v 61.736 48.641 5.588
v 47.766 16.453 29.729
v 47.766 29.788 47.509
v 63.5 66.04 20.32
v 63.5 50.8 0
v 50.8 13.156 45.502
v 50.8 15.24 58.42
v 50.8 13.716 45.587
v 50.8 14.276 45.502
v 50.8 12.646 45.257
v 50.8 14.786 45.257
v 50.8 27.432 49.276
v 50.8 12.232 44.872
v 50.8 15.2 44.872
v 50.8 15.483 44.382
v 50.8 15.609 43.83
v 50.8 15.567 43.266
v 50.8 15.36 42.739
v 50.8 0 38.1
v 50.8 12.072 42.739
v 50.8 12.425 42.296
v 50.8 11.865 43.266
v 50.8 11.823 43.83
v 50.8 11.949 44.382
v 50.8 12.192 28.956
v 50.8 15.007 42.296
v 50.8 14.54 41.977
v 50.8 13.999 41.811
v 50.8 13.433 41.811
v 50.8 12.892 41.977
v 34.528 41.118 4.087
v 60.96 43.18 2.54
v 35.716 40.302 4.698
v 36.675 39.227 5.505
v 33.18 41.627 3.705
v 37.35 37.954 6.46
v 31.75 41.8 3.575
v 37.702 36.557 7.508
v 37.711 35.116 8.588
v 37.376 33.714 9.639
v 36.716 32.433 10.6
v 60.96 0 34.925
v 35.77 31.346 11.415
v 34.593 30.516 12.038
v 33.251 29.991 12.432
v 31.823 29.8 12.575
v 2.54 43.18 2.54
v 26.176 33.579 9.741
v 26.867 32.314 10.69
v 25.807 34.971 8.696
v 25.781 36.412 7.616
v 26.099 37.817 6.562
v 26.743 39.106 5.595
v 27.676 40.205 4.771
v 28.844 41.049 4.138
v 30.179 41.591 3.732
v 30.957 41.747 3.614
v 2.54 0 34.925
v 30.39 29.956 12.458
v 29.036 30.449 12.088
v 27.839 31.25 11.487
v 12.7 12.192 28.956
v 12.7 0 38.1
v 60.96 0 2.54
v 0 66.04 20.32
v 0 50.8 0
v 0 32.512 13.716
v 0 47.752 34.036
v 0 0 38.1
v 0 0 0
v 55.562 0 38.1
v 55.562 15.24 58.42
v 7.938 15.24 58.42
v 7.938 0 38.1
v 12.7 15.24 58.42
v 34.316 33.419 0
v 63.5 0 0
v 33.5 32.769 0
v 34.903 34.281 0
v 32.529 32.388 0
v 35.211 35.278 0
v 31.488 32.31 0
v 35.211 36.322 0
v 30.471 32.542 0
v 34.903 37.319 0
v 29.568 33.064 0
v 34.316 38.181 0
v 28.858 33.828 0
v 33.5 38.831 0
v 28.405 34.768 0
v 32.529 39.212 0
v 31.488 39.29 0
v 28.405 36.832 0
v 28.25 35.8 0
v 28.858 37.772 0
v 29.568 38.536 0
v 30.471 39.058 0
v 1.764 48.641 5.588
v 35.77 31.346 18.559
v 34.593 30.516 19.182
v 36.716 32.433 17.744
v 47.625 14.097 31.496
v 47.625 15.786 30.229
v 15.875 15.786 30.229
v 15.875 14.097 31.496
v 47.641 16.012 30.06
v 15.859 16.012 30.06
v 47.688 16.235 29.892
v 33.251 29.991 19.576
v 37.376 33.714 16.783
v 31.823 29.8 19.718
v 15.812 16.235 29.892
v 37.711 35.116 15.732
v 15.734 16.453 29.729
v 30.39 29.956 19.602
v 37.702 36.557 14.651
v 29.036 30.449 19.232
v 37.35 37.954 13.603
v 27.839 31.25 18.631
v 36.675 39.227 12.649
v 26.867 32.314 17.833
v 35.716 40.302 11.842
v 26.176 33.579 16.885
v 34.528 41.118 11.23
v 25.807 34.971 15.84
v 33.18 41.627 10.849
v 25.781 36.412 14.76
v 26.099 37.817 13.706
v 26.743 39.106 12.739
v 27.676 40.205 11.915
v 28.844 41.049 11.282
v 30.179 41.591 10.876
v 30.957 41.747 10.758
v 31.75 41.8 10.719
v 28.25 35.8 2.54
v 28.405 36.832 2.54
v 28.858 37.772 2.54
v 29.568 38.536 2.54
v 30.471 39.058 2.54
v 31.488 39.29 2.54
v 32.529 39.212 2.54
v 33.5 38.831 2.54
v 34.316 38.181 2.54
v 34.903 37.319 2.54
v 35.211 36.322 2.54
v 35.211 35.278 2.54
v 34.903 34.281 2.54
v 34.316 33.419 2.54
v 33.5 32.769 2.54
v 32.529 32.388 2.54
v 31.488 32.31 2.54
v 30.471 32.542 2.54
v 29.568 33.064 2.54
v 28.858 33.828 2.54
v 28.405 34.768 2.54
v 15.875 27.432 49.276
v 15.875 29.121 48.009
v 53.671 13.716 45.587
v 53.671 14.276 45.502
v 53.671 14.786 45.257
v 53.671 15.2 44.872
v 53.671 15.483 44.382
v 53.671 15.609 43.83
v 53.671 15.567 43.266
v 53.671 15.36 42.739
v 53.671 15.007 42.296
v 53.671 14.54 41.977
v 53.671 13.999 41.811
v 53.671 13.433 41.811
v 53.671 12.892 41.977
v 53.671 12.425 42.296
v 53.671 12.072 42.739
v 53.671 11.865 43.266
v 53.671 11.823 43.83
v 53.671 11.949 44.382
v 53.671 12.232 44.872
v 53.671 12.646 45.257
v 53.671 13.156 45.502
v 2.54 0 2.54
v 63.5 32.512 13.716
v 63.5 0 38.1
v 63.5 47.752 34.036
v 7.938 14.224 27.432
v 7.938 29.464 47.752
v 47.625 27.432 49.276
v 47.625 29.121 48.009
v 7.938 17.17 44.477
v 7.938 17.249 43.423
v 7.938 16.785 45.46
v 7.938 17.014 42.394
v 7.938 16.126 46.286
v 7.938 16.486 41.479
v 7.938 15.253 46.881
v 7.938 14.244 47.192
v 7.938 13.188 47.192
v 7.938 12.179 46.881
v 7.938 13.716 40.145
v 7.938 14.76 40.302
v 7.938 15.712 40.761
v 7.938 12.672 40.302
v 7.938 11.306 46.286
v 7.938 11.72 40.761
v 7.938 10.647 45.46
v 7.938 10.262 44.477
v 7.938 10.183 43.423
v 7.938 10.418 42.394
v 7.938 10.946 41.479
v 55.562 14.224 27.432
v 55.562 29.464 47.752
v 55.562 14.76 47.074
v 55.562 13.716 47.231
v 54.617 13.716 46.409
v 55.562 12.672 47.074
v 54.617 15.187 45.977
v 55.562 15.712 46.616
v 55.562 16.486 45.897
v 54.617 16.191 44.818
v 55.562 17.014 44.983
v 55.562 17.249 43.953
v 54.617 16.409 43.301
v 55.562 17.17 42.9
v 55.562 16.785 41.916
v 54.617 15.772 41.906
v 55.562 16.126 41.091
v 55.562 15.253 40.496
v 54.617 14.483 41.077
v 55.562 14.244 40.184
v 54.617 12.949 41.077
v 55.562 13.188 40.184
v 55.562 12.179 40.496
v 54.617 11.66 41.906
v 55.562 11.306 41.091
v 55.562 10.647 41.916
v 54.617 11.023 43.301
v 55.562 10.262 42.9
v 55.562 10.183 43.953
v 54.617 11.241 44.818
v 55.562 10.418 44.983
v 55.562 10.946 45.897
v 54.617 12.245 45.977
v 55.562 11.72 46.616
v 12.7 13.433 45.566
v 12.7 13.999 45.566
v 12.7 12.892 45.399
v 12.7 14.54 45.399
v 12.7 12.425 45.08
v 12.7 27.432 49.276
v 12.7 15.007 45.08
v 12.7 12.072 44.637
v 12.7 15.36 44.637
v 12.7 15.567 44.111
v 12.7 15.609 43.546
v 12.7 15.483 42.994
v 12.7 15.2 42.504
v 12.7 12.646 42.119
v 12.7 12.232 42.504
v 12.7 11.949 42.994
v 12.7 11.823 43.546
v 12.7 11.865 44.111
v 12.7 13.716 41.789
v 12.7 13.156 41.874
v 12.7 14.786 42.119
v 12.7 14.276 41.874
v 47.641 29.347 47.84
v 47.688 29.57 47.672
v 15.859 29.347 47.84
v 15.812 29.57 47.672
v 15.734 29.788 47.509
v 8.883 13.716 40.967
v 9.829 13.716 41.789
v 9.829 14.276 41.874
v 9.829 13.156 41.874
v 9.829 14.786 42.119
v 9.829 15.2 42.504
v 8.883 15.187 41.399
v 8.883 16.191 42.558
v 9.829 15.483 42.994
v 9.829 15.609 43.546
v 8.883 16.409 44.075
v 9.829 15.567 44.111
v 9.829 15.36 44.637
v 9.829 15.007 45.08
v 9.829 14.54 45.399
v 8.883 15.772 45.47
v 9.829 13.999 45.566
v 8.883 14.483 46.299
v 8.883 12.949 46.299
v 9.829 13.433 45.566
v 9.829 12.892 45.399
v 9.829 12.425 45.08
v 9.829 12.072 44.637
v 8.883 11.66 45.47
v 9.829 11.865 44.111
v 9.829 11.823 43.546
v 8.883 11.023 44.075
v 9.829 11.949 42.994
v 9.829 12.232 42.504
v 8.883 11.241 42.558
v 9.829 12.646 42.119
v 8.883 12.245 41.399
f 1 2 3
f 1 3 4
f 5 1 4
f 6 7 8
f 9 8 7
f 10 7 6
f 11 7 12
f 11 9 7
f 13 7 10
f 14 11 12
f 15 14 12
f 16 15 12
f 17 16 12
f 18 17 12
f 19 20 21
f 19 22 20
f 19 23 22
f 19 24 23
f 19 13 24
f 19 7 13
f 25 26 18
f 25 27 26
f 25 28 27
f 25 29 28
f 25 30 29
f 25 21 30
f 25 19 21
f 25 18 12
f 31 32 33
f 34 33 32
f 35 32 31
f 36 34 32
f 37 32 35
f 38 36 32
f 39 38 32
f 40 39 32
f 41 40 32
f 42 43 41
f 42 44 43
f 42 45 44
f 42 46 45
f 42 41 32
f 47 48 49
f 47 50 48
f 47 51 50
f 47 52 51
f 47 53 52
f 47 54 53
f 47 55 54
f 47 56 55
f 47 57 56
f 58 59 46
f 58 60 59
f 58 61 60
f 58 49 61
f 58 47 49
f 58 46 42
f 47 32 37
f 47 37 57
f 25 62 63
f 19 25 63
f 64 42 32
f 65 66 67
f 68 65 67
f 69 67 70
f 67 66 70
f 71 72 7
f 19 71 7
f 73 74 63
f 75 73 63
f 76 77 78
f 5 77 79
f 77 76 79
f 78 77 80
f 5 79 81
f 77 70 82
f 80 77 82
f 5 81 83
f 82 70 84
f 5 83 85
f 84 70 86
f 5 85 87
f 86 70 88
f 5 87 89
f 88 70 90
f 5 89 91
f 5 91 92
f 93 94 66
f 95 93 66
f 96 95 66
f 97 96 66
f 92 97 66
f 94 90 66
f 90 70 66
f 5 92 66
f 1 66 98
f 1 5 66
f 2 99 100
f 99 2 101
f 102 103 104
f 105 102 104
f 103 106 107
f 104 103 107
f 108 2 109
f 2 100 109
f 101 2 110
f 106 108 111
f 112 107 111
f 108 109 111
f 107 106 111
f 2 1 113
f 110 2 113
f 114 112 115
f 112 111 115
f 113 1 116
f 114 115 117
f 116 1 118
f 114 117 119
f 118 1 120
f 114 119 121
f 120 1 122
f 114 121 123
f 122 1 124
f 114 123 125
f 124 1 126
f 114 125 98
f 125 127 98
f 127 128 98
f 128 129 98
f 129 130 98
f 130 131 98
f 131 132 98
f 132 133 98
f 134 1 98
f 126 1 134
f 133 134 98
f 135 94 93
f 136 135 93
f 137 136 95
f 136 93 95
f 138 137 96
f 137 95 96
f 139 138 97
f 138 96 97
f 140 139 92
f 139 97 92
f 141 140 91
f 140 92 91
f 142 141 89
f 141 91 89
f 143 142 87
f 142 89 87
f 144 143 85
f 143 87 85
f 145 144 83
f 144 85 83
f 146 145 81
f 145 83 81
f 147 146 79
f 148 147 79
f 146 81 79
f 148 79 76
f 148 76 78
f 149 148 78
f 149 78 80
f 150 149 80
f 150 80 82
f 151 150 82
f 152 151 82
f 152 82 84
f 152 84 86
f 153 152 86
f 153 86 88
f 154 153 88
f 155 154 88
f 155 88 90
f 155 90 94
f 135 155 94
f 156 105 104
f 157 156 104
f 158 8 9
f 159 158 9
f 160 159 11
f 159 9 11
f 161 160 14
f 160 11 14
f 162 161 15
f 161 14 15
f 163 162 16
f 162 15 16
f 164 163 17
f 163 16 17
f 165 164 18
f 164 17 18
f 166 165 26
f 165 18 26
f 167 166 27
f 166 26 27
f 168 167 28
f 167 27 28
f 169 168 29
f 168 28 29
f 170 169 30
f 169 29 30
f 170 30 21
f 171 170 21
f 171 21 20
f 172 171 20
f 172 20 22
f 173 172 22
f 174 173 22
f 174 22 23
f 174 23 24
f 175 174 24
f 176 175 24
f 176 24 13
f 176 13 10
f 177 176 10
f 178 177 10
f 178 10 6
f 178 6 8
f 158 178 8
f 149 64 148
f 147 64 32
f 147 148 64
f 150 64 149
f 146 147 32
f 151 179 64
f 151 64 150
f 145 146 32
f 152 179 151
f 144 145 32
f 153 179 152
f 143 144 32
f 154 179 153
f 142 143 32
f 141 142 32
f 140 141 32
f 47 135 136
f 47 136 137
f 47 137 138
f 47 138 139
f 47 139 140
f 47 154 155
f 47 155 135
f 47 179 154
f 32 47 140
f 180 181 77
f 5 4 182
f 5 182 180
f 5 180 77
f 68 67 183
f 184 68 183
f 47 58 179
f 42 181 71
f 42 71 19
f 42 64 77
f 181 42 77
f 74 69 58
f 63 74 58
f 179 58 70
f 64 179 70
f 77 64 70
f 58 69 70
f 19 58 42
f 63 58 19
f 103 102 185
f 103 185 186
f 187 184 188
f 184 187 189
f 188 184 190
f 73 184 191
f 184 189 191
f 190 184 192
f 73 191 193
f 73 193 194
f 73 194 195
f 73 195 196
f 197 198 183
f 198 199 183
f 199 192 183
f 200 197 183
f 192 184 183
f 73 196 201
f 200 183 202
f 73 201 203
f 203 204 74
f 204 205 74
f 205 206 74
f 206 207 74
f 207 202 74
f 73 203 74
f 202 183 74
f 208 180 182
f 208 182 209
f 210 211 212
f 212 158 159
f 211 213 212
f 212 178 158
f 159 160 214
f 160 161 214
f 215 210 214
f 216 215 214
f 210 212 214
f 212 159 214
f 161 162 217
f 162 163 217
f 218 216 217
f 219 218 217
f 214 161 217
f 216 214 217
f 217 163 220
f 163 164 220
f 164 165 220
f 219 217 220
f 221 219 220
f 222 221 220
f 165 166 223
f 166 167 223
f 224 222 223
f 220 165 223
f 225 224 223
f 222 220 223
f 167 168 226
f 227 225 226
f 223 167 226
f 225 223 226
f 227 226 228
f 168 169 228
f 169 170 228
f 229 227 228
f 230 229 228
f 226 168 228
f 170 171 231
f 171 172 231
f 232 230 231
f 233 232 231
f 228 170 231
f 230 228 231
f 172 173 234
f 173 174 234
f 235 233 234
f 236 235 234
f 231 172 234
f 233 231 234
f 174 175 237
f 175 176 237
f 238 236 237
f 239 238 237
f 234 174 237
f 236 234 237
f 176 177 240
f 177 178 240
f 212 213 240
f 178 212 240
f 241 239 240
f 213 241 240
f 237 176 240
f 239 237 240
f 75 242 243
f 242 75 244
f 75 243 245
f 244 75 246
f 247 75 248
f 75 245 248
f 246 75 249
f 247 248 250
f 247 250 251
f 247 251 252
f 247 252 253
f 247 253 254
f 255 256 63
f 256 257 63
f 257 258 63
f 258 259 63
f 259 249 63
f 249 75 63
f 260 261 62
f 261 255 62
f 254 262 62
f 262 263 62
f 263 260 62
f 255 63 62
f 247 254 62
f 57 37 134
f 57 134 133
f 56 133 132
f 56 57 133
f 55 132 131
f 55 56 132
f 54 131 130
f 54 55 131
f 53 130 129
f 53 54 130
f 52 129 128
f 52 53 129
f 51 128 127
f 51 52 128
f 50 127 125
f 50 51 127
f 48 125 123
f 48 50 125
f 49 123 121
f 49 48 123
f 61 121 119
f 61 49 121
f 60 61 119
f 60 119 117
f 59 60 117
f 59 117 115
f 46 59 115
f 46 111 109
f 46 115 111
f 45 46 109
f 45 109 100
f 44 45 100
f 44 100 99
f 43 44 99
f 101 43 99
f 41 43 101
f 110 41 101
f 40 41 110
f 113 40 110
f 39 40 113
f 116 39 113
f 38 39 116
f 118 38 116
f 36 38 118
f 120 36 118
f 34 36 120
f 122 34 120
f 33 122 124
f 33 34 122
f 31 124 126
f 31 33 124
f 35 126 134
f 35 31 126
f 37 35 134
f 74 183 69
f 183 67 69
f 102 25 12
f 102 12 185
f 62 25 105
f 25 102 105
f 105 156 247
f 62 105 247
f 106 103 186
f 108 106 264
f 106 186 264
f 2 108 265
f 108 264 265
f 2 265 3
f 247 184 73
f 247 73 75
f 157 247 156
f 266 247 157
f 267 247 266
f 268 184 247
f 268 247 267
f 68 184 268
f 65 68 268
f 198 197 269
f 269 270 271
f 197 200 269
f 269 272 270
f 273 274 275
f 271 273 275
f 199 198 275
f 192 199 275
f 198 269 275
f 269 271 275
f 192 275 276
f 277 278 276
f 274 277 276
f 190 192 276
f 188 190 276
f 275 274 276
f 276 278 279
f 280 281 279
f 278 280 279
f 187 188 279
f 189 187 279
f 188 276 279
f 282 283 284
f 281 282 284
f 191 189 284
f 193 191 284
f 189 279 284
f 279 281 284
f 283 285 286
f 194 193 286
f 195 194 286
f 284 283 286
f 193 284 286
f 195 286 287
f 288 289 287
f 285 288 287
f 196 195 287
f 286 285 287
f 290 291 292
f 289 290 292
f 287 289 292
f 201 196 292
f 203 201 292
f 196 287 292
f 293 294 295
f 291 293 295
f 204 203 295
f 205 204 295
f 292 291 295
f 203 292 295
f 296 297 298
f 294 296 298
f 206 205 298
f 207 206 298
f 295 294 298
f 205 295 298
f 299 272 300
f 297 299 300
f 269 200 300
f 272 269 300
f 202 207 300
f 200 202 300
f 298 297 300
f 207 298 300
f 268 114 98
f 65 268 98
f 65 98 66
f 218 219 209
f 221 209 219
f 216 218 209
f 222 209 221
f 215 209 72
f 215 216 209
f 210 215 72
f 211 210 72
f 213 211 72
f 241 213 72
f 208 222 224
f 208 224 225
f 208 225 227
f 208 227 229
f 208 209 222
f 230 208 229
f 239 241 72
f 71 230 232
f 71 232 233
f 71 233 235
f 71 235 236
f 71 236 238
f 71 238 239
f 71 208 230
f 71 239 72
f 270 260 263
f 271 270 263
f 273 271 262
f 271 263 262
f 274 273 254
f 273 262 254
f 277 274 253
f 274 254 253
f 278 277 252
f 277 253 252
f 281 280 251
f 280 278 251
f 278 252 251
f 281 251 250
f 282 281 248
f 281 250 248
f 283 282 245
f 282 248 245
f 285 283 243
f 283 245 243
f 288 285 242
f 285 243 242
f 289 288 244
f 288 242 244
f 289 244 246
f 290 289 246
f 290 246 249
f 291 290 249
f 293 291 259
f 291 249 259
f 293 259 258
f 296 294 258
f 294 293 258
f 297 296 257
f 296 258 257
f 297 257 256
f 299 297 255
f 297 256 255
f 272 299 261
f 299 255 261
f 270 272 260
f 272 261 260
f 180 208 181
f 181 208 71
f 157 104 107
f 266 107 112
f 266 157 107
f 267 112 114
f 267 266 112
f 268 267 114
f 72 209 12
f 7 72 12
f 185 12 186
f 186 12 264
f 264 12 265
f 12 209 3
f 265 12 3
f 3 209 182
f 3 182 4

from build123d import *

# Parameters (mm, degrees)
BOSS_EXTRUDE2_DEPTH                            = 63.5
SHELL1_T                                       = -2.54
BOSS_EXTRUDE4_DEPTH                            = 25.4
FILLET1_R                                      = 2.54
CSK_FOR_6_FLAT_HEAD_MACHINE_SCREW2_D           = 3.7973
CSK_FOR_6_FLAT_HEAD_MACHINE_SCREW2_DEPTH       = 4.7625
CSK_FOR_6_FLAT_HEAD_MACHINE_SCREW2_CSINK_D     = 7.0866
CSK_FOR_6_FLAT_HEAD_MACHINE_SCREW2_CSINK_ANGLE = 82
CSK_FOR_6_FLAT_HEAD_MACHINE_SCREW1_D           = 3.7973
CSK_FOR_6_FLAT_HEAD_MACHINE_SCREW1_CSINK_D     = 7.0866
CSK_FOR_6_FLAT_HEAD_MACHINE_SCREW1_CSINK_ANGLE = 82
CUT_EXTRUDE1_REACH                             = 110.657
SKETCH10_R                                     = 3.5
BOSS_EXTRUDE6_START                            = 3.175
BOSS_EXTRUDE6_DEPTH                            = 3.175
SKETCH15_R                                     = 6
CUT_EXTRUDE2_DEPTH                             = 38.735


with BuildPart() as part:
    # Sketch4 → Boss-Extrude2 (new body)
    with BuildSketch(Plane(origin=(0, 0, 0), x_dir=(0, 0, -1), z_dir=(1, 0, 0))):
        Polygon((0, 50.8), (-38.100141797, 0), (0, 0), align=None)
    extrude(amount=BOSS_EXTRUDE2_DEPTH)

    # Shell1
    shell1_openings = [part.faces().sort_by_distance(p)[0] for p in [
        (31.75, 0, 19.050070899),
    ]]
    offset(amount=SHELL1_T, openings=shell1_openings, kind=Kind.INTERSECTION)

    # Sketch5 → Boss-Extrude4 (add)
    with BuildSketch(Plane(origin=(0, 18.28808712, 24.38402541), x_dir=(1, 0, 0), z_dir=(0, 0.6000014291326663, 0.7999989281485057))):
        Polygon((12.7, -22.860139528), (12.7, -7.620139528), (15.875, -7.620139528), (15.875, -5.080139528), (0, 40.63994555), (0, 17.779903011), (7.9375, -5.080139528), (7.9375, -22.860139528), align=None)
        Polygon((55.5625, -5.080139528), (55.5625, -22.860139528), (50.8, -22.860139528), (50.8, -7.620139528), (47.625, -7.620139528), (47.625, -5.080139528), (63.5, 40.63994555), (63.5, 17.779903011), align=None)
    extrude(amount=BOSS_EXTRUDE4_DEPTH)

    # Fillet1
    fillet1_edges = [part.edges().sort_by_distance(p)[0] for p in [
        (15.875, 21.843999092, 37.592102775),
        (47.625, 21.843999092, 37.592102775),
    ]]
    fillet(fillet1_edges, radius=FILLET1_R)

    # CSK for #6 Flat Head Machine Screw2
    with Locations(Plane.ZY.offset(-7.9375)):
        with Locations((43.688117295, 13.716009982)):
            CounterSinkHole(CSK_FOR_6_FLAT_HEAD_MACHINE_SCREW2_D / 2, CSK_FOR_6_FLAT_HEAD_MACHINE_SCREW2_CSINK_D / 2, depth=CSK_FOR_6_FLAT_HEAD_MACHINE_SCREW2_DEPTH, counter_sink_angle=CSK_FOR_6_FLAT_HEAD_MACHINE_SCREW2_CSINK_ANGLE)

    # CSK for #6 Flat Head Machine Screw1 (through all)
    with Locations(Plane(origin=(55.5625, 0, 0), x_dir=(0, 0, -1), z_dir=(1, 0, 0))):
        with Locations((-43.688117295, 13.716009982)):
            CounterSinkHole(CSK_FOR_6_FLAT_HEAD_MACHINE_SCREW1_D / 2, CSK_FOR_6_FLAT_HEAD_MACHINE_SCREW1_CSINK_D / 2, counter_sink_angle=CSK_FOR_6_FLAT_HEAD_MACHINE_SCREW1_CSINK_ANGLE)

    # Sketch10 → Cut-Extrude1 (cut, up to next)
    with BuildSketch(Plane(origin=(0, 0, 0), x_dir=(-1, 0, 0), z_dir=(0, 0, -1)), mode=Mode.PRIVATE) as cut_extrude1_sk1:
        with Locations((-31.75, 35.8)):
            Circle(SKETCH10_R)
    cut_extrude1_tool1 = extrude(cut_extrude1_sk1.sketch, amount=-CUT_EXTRUDE1_REACH, mode=Mode.PRIVATE) & part.part
    add(cut_extrude1_tool1.solids().sort_by_distance((31.75, 35.8, 0))[0], mode=Mode.SUBTRACT)

    # Sketch11 → Boss-Extrude6 (add)
    with BuildSketch(Plane(origin=(0, 18.28808712, 24.38402541), x_dir=(1, 0, 0), z_dir=(0, 0.6000014291326664, 0.7999989281485057)).offset(BOSS_EXTRUDE6_START)):
        with BuildLine():
            Line((1.763885607, 35.55994555), (61.736114393, 35.55994555))
            Line((61.736114393, 35.55994555), (47.765528412, -4.675416947))
            ThreePointArc((47.765528412, -4.675416947), (47.660378488, -5.086106873), (47.625, -5.508565254))
            Line((47.625, -5.508565254), (47.625, -7.620139528))
            Line((47.625, -7.620139528), (15.875, -7.620139528))
            Line((15.875, -7.620139528), (15.875, -5.508565254))
            ThreePointArc((15.875, -5.508565254), (15.839621512, -5.086106873), (15.734471588, -4.675416947))
            Line((15.734471588, -4.675416947), (1.763885607, 35.55994555))
        make_face()
    extrude(amount=-BOSS_EXTRUDE6_DEPTH)

    # Sketch14 → Loft2 section 0
    with BuildSketch(Plane(origin=(12.592837865, 3.497999322, -2.623509255), x_dir=(-0.16778323619732566, -0.12899238858965661, -0.9773483254894785), z_dir=(0.9446738533698645, 0.2624085638294688, -0.19680715532796914))):
        with BuildLine():
            Line((-6.55281334, 48.579854588), (-12.031696709, 45.583164002))
            Line((-12.031696709, 45.583164002), (-9.303504202, 43.959097917))
            Line((-9.303504202, 43.959097917), (-6.55281334, 48.579854588))
        make_face()
    # Sketch12 → Loft2 section 1
    with BuildSketch(Plane(origin=(44.075113902, -12.243048009, 9.182320181), x_dir=(-0.16312891841524135, 0.1446897924855975, 0.9759374057423705), z_dir=(-0.9446738533698645, 0.26240856382946876, -0.19680715532796894))):
        with BuildLine():
            Line((2.42045406, 63.449507231), (-3.008444861, 66.535827684))
            Line((-3.008444861, 66.535827684), (-0.334058341, 61.870492844))
            Line((-0.334058341, 61.870492844), (2.42045406, 63.449507231))
        make_face()
    loft()

    # Sketch15 → Cut-Extrude2 (cut)
    with BuildSketch(Plane.XY.offset(2.54)):
        with Locations(Location((31.75, 35.8, 0), (0, 0, 90))):
            Circle(SKETCH15_R)
    extrude(amount=CUT_EXTRUDE2_DEPTH, mode=Mode.SUBTRACT)


solid = part.part
